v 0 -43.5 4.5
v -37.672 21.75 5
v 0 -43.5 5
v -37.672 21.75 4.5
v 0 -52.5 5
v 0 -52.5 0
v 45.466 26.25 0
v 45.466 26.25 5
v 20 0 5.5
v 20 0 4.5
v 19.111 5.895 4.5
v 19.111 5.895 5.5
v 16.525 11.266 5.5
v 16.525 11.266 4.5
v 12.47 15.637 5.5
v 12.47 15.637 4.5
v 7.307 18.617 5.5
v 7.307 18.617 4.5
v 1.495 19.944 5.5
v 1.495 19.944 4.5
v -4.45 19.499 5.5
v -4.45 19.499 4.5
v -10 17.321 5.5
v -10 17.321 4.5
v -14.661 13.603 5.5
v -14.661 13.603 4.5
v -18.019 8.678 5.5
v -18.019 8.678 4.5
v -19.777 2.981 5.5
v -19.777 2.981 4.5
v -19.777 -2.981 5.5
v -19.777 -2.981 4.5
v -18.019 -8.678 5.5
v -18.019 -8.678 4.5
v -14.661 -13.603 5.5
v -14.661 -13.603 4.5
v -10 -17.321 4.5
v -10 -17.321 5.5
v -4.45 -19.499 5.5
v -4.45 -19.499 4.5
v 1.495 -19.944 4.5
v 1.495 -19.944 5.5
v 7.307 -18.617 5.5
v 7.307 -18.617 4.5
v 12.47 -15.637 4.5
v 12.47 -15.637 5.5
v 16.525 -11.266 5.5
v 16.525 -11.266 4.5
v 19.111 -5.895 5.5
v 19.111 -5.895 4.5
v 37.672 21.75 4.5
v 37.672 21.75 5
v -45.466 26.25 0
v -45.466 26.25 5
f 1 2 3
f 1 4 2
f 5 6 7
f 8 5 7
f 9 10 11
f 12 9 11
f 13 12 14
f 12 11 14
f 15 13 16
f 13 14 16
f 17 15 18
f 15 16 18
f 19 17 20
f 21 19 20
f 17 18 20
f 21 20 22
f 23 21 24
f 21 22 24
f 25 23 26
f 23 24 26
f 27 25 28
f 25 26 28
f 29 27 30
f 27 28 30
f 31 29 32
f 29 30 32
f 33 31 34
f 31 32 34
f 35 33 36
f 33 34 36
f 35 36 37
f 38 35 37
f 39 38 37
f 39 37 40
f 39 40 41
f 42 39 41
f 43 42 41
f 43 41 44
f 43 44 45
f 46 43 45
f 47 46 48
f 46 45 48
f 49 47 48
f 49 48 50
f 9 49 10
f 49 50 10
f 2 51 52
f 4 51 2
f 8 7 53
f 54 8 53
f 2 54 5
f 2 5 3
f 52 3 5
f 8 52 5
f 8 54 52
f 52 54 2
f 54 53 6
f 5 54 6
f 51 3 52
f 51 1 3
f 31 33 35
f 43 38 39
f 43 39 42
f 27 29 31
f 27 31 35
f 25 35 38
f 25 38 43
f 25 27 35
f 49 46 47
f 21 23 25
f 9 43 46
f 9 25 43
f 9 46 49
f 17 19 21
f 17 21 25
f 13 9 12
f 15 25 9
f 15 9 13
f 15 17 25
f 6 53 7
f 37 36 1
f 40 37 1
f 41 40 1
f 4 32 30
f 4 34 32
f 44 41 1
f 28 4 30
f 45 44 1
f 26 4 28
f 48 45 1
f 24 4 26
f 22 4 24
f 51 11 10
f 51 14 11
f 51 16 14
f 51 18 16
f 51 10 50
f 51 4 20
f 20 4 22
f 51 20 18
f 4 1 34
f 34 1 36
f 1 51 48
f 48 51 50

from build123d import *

# Parameters (mm, degrees)
F2_DEPTH = 5
F0_R     = 20.5
F3_DEPTH = 5
F4_T     = -4.5
F5_R     = 20
F6_DEPTH = 1


with BuildPart() as f2:
    # F1 (on Top) → F2 (new body)
    with BuildSketch(Plane.XY):
        Polygon((45.466336, 26.250001), (-45.466336, 26.250001), (0, -52.500002), align=None)
    extrude(amount=F2_DEPTH)

    # F0 (on Top) → F3 (join)
    with BuildSketch(Plane.XY):
        Circle(F0_R)
    extrude(amount=F3_DEPTH)

    # F4
    f4_openings = [f2.faces().sort_by_distance(p)[0] for p in [
        (0, 0, 5),
    ]]
    offset(amount=F4_T, openings=f4_openings)

    # F5 (on face) → F6 (join)
    with BuildSketch(Plane.XY.offset(4.5)):
        Circle(F5_R)
    extrude(amount=F6_DEPTH)


solid = f2.part
